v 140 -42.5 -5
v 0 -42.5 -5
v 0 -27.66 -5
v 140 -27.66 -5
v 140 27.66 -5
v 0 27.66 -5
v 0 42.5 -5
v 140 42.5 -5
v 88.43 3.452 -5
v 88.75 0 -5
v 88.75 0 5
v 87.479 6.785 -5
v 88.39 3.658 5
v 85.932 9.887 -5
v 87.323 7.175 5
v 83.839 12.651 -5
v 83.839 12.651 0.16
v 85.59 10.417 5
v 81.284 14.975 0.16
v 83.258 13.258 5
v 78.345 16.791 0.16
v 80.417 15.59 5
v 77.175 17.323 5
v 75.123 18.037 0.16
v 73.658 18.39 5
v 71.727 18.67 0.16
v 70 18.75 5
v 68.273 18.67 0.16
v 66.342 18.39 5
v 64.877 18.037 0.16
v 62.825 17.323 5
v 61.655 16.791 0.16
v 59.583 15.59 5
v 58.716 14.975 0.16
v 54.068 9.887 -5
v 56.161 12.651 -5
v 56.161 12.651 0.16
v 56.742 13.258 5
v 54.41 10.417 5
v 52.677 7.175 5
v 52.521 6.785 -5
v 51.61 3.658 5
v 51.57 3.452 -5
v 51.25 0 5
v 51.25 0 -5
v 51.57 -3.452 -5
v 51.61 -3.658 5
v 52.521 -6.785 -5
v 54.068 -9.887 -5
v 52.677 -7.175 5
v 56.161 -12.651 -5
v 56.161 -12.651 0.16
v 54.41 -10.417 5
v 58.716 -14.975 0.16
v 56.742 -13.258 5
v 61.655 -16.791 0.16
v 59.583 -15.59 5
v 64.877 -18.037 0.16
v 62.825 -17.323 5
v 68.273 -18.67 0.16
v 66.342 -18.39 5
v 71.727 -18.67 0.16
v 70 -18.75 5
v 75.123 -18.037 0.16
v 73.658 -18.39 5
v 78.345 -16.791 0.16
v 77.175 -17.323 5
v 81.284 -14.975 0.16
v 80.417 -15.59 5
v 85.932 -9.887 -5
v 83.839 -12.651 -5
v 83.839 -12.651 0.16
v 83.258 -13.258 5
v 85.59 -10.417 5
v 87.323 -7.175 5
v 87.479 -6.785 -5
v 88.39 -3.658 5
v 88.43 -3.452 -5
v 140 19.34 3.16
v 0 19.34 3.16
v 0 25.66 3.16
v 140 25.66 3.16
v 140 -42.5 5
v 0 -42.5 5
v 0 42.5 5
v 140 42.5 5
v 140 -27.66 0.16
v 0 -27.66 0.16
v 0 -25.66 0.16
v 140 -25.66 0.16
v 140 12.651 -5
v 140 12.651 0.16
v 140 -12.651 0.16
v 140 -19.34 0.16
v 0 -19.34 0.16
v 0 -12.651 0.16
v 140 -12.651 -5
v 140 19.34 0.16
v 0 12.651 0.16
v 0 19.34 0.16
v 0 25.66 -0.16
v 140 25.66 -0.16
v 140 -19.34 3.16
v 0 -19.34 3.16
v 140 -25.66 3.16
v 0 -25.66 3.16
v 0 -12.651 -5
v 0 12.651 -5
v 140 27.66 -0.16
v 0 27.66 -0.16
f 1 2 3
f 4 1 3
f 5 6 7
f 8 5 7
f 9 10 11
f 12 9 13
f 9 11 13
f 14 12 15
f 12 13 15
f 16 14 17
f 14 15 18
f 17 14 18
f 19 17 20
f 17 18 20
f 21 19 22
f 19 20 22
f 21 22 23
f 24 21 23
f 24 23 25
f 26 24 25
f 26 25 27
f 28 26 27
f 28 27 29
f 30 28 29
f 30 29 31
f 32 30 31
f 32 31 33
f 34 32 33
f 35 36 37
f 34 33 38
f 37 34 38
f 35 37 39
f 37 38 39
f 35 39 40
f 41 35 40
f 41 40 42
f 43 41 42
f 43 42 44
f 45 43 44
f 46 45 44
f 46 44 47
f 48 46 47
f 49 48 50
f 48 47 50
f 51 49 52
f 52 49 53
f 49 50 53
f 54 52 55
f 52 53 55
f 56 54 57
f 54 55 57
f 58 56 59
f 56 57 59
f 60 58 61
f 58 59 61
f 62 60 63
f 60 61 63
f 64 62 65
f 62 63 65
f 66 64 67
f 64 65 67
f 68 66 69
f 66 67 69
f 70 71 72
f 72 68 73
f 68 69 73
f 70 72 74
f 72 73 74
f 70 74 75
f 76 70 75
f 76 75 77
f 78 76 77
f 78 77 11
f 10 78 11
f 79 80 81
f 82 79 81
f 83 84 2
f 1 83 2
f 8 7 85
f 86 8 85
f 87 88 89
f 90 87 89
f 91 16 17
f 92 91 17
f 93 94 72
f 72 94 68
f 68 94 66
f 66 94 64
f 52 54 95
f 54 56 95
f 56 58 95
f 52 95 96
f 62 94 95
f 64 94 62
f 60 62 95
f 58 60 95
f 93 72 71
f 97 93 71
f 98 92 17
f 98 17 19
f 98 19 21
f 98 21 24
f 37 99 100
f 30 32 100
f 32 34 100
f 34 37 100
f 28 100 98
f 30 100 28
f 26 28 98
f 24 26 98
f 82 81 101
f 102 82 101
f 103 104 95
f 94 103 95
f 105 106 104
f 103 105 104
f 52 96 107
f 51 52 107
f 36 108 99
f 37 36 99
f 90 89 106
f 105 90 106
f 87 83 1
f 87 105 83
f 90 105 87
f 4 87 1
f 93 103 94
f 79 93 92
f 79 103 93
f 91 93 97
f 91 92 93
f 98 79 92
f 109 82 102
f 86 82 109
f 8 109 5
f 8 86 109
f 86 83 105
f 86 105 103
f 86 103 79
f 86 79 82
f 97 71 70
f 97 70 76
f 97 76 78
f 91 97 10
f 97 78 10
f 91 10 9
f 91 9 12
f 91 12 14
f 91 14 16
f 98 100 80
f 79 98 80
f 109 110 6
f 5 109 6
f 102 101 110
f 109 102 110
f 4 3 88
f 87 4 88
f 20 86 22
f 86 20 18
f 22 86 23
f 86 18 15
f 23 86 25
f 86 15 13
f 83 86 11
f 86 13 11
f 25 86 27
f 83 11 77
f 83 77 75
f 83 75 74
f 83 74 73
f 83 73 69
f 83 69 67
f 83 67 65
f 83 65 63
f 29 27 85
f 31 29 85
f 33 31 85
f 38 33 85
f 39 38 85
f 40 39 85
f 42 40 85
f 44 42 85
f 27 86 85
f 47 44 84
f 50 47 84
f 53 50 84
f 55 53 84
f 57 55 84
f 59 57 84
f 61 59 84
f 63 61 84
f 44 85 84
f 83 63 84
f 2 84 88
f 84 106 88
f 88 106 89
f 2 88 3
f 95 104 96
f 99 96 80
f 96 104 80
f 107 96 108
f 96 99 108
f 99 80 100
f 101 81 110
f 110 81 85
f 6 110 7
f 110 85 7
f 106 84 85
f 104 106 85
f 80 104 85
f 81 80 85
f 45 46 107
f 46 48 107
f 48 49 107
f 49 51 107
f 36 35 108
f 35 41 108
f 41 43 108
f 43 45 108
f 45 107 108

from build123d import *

# Parameters (mm, degrees)
BOSS_EXTRUDE1_DEPTH = 140
SKETCH2_R           = 18.75
CUT_EXTRUDE1_DEPTH  = 147.650093761


with BuildPart() as part:
    # Sketch1 → Boss-Extrude1 (new body)
    with BuildSketch(Plane(origin=(0, 0, 0), x_dir=(0, 0, -1), z_dir=(1, 0, 0))):
        Polygon((0.16, 27.66), (5, 27.66), (5, 42.5), (-5, 42.5), (-5, -42.5), (5, -42.5), (5, -27.66), (-0.16, -27.66), (-0.16, -25.66), (-3.16, -25.66), (-3.16, -19.34), (-0.16, -19.34), (-0.16, -12.650615569), (5, -12.650615569), (5, 12.650615569), (-0.16, 12.650615569), (-0.16, 19.34), (-3.16, 19.34), (-3.16, 25.66), (0.16, 25.66), align=None)
    extrude(amount=BOSS_EXTRUDE1_DEPTH)

    # Sketch2 → Cut-Extrude1 (cut, through all)
    with BuildSketch(Plane.XY.offset(5)):
        with Locations((70, 0)):
            Circle(SKETCH2_R)
    extrude(amount=-CUT_EXTRUDE1_DEPTH, mode=Mode.SUBTRACT)


solid = part.part
